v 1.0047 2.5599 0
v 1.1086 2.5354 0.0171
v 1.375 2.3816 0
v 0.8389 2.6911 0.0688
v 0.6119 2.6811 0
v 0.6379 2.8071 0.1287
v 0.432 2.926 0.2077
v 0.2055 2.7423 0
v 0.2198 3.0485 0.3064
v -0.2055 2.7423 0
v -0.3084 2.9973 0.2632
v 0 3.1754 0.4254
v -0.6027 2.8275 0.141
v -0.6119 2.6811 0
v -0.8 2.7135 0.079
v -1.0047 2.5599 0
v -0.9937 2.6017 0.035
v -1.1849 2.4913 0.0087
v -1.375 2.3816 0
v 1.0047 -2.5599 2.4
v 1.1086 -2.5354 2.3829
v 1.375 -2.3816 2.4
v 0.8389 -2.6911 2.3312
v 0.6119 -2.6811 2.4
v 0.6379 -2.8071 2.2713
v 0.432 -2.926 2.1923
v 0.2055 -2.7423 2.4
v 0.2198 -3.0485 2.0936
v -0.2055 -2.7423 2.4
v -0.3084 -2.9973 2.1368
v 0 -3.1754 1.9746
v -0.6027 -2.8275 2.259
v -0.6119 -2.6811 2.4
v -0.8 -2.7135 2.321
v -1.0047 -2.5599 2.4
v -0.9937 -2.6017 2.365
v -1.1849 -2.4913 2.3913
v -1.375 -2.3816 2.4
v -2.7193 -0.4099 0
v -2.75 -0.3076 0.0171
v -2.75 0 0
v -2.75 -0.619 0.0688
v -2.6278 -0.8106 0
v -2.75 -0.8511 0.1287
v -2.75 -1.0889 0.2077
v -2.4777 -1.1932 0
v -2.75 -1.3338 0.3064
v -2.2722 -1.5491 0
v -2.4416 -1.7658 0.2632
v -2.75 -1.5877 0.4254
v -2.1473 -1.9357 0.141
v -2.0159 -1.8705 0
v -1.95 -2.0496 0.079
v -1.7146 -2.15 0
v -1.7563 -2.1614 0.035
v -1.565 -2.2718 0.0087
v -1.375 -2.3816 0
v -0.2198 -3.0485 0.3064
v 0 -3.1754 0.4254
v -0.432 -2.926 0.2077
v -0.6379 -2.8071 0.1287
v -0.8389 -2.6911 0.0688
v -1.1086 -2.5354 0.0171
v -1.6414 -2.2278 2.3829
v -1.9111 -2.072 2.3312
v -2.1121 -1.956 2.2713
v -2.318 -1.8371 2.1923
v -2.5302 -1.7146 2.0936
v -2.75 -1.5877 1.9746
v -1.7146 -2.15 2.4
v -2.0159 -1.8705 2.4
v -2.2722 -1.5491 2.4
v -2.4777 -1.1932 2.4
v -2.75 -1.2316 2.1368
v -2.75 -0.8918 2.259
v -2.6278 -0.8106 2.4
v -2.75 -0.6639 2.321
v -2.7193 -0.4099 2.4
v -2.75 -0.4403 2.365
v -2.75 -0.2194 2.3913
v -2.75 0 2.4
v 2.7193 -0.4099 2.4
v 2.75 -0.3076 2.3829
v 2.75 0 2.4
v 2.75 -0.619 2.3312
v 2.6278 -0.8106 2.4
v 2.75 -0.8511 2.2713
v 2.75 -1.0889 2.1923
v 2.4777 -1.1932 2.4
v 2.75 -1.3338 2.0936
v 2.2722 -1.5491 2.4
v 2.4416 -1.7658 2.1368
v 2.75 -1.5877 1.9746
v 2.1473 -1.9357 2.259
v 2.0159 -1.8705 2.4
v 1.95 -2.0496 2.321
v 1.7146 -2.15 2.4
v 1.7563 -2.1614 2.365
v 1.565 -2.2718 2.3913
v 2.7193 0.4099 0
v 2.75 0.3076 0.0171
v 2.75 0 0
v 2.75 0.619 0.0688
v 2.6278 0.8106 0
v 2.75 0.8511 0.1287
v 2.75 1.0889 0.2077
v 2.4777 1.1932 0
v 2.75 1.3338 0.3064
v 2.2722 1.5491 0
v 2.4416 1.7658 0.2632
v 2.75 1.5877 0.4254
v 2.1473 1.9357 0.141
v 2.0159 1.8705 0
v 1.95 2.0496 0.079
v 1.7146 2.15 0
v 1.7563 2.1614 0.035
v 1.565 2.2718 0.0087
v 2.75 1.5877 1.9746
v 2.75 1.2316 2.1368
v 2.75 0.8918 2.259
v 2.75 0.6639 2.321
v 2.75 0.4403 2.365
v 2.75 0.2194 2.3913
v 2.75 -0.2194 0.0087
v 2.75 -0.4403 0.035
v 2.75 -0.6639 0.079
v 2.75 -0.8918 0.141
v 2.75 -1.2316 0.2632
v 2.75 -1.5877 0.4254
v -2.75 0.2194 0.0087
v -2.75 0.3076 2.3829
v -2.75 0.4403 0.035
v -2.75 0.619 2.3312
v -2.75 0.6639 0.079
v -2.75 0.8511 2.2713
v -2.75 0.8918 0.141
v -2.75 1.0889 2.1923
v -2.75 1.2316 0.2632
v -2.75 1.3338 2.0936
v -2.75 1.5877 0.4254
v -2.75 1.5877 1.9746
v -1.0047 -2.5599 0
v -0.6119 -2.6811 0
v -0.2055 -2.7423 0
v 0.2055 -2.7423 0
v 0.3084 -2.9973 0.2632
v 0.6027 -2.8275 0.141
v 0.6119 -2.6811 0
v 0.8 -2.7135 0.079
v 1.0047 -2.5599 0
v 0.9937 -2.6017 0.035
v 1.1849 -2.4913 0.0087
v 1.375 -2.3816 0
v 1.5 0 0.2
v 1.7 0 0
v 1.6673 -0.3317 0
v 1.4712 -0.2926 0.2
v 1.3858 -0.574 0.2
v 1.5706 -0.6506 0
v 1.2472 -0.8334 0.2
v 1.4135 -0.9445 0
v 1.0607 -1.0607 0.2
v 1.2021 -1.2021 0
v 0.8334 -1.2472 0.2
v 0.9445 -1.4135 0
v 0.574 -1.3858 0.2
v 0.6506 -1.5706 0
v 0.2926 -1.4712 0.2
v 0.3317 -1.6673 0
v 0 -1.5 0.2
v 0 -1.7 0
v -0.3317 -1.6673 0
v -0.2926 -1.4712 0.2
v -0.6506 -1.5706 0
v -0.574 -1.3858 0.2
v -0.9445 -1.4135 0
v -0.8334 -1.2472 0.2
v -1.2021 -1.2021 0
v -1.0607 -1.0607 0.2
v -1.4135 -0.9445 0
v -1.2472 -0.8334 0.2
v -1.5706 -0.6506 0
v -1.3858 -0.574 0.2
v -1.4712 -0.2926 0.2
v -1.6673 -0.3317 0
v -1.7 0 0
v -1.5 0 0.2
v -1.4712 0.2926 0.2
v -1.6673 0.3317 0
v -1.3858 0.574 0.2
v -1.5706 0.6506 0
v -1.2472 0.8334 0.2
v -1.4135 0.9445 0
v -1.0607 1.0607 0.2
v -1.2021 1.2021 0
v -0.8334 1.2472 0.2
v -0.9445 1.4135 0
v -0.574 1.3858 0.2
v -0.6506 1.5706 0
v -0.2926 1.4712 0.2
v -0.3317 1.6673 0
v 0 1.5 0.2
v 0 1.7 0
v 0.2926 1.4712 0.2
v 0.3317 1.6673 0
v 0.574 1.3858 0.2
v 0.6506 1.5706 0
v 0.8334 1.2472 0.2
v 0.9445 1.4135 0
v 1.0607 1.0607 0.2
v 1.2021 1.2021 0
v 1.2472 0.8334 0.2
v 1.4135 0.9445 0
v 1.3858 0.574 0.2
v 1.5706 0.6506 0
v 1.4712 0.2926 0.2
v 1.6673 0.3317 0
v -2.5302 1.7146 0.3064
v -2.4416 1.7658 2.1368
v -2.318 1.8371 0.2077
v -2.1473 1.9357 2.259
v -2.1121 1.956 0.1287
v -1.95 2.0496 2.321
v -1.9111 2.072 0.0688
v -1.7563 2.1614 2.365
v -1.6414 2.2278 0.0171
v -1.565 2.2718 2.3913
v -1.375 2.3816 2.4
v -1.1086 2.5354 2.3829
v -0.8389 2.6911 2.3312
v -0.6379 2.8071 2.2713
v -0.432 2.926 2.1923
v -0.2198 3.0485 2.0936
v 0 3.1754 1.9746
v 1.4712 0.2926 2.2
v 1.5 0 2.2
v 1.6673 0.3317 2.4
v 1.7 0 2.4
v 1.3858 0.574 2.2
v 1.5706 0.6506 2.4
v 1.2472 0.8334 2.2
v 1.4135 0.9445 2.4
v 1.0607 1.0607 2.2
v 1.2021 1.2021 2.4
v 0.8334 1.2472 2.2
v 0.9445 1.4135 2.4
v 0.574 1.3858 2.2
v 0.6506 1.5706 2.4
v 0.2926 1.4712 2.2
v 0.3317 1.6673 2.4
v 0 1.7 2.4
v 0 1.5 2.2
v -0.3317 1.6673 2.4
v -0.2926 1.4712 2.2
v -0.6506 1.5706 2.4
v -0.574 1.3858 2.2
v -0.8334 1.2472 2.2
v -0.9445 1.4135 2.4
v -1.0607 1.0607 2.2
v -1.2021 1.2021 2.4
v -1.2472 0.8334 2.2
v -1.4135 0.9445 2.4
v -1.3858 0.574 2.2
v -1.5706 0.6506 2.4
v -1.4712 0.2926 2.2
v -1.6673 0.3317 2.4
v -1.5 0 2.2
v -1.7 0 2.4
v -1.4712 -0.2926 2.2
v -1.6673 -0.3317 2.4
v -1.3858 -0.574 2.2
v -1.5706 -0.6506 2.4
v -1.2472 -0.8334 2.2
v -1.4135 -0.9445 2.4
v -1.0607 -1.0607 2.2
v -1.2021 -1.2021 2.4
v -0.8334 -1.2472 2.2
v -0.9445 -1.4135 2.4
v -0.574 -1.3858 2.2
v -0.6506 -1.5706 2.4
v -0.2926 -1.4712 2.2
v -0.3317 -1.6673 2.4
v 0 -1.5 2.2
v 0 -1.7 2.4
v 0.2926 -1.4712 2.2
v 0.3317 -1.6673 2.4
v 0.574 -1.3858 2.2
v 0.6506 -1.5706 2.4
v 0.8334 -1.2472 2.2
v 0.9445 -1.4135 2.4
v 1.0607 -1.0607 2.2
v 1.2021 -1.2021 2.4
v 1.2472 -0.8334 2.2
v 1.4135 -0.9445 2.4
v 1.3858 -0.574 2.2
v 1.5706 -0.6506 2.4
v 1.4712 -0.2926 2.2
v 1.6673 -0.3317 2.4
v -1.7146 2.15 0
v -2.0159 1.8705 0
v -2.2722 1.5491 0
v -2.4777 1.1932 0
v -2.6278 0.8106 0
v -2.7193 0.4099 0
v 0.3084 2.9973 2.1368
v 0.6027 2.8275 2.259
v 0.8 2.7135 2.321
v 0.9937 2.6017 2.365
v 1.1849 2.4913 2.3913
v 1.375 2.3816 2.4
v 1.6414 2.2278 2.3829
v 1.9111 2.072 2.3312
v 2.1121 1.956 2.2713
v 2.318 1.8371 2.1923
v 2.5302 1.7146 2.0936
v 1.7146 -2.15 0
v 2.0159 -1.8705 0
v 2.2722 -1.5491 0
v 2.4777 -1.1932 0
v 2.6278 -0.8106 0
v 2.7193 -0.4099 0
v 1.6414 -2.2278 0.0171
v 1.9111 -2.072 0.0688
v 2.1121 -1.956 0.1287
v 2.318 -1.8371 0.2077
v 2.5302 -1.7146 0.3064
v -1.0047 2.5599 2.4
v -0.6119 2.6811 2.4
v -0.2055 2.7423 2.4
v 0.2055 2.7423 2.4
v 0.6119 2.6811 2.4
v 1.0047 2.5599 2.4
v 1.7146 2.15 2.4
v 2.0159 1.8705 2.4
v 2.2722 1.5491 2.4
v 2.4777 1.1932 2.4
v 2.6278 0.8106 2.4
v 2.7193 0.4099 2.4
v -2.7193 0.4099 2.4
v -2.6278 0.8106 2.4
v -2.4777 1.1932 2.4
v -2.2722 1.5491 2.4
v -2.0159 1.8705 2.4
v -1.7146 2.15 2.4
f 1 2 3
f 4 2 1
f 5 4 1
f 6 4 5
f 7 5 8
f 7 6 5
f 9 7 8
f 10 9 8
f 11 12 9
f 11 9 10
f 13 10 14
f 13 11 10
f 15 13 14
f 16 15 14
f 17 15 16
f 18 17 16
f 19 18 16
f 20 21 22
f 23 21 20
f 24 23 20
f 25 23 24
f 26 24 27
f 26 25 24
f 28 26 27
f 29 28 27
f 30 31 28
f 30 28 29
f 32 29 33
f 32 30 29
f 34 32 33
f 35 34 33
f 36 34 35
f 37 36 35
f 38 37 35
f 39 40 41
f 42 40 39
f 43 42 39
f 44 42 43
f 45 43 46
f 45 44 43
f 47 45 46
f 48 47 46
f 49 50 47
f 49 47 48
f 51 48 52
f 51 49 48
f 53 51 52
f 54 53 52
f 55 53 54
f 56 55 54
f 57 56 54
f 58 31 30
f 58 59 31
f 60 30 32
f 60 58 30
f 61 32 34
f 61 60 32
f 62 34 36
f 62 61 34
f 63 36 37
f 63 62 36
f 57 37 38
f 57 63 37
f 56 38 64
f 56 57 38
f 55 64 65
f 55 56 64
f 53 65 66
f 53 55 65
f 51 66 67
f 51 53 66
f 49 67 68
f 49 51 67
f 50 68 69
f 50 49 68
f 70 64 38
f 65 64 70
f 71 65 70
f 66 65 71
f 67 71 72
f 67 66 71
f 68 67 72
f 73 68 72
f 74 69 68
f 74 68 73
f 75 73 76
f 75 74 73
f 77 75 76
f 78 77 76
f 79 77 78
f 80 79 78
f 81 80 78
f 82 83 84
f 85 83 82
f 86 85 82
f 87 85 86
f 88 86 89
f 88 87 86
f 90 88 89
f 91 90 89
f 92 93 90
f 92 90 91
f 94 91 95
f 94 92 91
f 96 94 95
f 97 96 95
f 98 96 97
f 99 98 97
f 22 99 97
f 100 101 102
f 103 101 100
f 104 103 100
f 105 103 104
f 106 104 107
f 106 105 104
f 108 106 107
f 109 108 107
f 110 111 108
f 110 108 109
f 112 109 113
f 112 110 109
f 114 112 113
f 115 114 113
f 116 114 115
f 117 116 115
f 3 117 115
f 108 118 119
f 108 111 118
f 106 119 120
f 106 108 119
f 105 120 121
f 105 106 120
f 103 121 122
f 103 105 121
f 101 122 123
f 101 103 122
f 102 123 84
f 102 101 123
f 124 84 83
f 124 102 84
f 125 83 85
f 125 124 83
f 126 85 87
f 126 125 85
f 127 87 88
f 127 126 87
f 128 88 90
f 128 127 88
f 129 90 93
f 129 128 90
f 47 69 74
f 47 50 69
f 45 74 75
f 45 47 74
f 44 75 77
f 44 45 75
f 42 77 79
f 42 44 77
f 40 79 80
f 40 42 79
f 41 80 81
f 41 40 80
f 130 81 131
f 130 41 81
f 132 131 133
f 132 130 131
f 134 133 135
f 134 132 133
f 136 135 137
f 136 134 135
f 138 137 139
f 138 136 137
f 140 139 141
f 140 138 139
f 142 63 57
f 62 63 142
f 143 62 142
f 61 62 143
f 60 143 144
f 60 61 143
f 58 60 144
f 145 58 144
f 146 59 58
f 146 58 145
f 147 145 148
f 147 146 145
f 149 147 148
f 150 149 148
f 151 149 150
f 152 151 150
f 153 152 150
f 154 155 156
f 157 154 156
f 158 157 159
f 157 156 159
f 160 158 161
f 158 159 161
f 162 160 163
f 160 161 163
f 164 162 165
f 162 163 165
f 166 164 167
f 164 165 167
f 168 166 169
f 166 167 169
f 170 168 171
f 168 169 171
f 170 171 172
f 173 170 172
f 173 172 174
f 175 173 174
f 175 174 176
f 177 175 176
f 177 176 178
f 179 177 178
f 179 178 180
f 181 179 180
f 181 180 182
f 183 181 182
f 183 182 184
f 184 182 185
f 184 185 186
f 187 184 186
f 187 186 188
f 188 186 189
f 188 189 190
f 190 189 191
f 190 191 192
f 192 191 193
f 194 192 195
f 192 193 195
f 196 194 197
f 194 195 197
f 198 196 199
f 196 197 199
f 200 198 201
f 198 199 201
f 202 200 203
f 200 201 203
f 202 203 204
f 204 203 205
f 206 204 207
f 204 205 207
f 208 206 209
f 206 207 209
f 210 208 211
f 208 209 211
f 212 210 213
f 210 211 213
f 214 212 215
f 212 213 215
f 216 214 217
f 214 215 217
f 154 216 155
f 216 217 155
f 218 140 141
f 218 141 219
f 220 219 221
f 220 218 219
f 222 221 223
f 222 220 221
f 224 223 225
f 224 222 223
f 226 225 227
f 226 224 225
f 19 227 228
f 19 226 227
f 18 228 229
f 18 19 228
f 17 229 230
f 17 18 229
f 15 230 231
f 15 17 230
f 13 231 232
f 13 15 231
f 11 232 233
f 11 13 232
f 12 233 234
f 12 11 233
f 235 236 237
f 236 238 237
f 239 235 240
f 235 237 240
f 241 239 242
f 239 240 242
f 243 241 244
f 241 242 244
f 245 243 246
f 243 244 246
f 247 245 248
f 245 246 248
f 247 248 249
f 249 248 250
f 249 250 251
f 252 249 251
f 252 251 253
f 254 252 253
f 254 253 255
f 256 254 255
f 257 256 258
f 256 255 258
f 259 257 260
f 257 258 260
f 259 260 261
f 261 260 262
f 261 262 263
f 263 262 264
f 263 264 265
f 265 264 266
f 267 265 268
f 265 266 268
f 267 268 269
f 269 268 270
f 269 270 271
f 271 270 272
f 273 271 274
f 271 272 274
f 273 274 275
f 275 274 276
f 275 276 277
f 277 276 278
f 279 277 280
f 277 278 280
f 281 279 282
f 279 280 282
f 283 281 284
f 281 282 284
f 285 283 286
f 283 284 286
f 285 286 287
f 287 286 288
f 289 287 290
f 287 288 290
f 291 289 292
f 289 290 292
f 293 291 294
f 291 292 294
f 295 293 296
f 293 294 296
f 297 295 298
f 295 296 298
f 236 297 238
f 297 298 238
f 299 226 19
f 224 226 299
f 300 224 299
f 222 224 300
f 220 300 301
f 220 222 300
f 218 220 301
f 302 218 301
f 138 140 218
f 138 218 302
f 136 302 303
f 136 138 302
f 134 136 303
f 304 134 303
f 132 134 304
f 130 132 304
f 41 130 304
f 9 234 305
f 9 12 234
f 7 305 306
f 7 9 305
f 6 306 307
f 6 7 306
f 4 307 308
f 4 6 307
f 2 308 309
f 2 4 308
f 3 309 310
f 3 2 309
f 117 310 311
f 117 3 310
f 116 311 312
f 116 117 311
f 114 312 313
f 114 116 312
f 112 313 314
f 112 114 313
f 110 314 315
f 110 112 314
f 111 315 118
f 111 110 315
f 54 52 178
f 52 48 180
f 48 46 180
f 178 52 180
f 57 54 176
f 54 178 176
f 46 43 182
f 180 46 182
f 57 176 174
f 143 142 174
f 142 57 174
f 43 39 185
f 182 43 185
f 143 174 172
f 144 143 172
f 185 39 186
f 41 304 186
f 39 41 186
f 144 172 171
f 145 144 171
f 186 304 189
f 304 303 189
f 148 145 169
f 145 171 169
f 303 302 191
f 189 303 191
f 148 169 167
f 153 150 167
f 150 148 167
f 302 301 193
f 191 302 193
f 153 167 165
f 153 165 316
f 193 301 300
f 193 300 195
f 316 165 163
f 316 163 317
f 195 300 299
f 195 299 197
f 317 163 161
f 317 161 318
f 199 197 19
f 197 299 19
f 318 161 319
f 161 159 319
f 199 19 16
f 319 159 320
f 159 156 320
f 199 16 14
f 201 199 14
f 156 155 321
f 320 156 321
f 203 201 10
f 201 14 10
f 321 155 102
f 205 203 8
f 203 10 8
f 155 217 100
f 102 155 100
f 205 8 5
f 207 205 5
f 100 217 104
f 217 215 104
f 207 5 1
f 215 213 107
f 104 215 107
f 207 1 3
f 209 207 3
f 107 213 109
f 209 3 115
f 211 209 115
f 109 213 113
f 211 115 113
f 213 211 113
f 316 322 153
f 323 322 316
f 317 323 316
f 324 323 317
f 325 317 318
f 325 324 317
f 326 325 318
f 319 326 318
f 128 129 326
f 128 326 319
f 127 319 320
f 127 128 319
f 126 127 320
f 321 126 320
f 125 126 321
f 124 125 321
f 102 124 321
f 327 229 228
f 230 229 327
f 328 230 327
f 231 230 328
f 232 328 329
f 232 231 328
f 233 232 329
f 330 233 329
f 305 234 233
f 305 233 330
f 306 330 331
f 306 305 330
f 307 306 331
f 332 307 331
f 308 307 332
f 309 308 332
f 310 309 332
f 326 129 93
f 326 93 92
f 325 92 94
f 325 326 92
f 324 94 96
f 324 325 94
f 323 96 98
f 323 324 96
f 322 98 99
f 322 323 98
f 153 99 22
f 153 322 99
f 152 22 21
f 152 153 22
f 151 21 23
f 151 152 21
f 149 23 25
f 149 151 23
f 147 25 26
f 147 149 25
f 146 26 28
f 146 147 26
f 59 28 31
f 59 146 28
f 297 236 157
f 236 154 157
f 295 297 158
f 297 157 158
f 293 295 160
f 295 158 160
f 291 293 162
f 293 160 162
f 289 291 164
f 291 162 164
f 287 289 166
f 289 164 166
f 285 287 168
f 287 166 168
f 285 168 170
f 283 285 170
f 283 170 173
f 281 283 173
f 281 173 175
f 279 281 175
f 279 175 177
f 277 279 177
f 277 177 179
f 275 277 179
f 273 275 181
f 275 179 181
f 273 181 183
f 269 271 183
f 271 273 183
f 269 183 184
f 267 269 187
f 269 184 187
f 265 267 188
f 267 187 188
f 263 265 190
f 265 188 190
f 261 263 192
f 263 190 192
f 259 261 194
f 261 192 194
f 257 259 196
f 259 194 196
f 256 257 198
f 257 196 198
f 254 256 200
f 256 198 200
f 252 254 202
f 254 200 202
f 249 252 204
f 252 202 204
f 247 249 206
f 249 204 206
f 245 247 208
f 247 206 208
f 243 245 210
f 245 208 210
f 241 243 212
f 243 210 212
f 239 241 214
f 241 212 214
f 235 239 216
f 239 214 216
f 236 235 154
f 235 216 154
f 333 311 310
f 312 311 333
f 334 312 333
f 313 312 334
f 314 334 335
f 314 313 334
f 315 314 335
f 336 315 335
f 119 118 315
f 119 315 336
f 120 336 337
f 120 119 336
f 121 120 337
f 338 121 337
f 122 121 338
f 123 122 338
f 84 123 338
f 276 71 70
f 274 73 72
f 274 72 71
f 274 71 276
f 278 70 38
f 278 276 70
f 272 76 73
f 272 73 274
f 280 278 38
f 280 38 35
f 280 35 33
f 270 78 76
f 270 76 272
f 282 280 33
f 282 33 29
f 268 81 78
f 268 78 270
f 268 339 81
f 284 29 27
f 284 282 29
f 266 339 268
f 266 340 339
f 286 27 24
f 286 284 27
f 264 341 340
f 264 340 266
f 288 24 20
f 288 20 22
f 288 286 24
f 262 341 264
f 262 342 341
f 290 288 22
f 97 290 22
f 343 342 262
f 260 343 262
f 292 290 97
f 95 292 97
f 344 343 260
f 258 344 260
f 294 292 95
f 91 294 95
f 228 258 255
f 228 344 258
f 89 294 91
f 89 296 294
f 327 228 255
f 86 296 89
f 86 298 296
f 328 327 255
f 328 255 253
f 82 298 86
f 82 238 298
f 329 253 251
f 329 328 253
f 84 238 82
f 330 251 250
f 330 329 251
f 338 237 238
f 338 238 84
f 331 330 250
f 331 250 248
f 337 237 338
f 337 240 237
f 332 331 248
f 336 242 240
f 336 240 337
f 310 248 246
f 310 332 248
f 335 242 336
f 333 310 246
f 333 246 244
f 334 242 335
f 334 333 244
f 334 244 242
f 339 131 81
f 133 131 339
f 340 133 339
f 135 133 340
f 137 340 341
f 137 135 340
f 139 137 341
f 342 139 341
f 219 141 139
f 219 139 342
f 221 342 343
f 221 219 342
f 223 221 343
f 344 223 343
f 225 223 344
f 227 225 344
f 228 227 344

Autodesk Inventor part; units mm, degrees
ref_plane "YZ Plane" through (0, 0, 0) normal (1, 0, 0) x (0, 1, 0)
ref_plane "XZ Plane" through (0, 0, 0) normal (0, 1, 0) x (-1, 0, 0)
ref_plane "XY Plane" through (0, 0, 0) normal (0, 0, 1) x (1, 0, 0)
sketch "Náčrt1" plane through (0, 0, 0) normal (0, 0, 1) x (1, 0, 0)
  line L0 (2.75, -1.5877) -> (0, -3.1754)
  line L1 (0, -3.1754) -> (-2.75, -1.5877)
  line L2 (-2.75, -1.5877) -> (-2.75, 1.5877)
  line L3 (-2.75, 1.5877) -> (0, 3.1754)
  line L4 (0, 3.1754) -> (2.75, 1.5877)
  line L5 (2.75, 1.5877) -> (2.75, -1.5877)
  circle A0 centre (0, 0) radius 1.5
  point P0 (2.75, 0)
  dimension "d1" = 3
extrude "Vysunutí1" add sketch "Náčrt1" along normal blind 2.4
thread "Závit1" size "M3x0.5" class "6H" standard "ANSI Metric M Profile" full length
sketch "Náčrt2" plane through (0, 0, 2.4) normal (0, 0, 1) x (1, 0, 0)
  circle A0 centre (0, 0) radius 2.75
extrude "Vysunutí2" cut sketch "Náčrt2" against normal through all draft 45 keep common part
sketch "Náčrt3" plane through (0, 0, 0) normal (0, 0, -1) x (-1, 0, 0)
  circle A0 centre (0, 0) radius 2.75
extrude "Vysunutí3" cut sketch "Náčrt3" against normal through all draft 45 keep common part
chamfer "Zkosení1" distance 0.2 angle 45 1 edges at (-1.5, 0, 2.4)
chamfer "Zkosení2" distance 0.2 angle 45 1 edges at (-1.5, 0, 0)
properties part number "Nut-M3" material "Ocel, vysokopevnostní, nízkolegovaná"
